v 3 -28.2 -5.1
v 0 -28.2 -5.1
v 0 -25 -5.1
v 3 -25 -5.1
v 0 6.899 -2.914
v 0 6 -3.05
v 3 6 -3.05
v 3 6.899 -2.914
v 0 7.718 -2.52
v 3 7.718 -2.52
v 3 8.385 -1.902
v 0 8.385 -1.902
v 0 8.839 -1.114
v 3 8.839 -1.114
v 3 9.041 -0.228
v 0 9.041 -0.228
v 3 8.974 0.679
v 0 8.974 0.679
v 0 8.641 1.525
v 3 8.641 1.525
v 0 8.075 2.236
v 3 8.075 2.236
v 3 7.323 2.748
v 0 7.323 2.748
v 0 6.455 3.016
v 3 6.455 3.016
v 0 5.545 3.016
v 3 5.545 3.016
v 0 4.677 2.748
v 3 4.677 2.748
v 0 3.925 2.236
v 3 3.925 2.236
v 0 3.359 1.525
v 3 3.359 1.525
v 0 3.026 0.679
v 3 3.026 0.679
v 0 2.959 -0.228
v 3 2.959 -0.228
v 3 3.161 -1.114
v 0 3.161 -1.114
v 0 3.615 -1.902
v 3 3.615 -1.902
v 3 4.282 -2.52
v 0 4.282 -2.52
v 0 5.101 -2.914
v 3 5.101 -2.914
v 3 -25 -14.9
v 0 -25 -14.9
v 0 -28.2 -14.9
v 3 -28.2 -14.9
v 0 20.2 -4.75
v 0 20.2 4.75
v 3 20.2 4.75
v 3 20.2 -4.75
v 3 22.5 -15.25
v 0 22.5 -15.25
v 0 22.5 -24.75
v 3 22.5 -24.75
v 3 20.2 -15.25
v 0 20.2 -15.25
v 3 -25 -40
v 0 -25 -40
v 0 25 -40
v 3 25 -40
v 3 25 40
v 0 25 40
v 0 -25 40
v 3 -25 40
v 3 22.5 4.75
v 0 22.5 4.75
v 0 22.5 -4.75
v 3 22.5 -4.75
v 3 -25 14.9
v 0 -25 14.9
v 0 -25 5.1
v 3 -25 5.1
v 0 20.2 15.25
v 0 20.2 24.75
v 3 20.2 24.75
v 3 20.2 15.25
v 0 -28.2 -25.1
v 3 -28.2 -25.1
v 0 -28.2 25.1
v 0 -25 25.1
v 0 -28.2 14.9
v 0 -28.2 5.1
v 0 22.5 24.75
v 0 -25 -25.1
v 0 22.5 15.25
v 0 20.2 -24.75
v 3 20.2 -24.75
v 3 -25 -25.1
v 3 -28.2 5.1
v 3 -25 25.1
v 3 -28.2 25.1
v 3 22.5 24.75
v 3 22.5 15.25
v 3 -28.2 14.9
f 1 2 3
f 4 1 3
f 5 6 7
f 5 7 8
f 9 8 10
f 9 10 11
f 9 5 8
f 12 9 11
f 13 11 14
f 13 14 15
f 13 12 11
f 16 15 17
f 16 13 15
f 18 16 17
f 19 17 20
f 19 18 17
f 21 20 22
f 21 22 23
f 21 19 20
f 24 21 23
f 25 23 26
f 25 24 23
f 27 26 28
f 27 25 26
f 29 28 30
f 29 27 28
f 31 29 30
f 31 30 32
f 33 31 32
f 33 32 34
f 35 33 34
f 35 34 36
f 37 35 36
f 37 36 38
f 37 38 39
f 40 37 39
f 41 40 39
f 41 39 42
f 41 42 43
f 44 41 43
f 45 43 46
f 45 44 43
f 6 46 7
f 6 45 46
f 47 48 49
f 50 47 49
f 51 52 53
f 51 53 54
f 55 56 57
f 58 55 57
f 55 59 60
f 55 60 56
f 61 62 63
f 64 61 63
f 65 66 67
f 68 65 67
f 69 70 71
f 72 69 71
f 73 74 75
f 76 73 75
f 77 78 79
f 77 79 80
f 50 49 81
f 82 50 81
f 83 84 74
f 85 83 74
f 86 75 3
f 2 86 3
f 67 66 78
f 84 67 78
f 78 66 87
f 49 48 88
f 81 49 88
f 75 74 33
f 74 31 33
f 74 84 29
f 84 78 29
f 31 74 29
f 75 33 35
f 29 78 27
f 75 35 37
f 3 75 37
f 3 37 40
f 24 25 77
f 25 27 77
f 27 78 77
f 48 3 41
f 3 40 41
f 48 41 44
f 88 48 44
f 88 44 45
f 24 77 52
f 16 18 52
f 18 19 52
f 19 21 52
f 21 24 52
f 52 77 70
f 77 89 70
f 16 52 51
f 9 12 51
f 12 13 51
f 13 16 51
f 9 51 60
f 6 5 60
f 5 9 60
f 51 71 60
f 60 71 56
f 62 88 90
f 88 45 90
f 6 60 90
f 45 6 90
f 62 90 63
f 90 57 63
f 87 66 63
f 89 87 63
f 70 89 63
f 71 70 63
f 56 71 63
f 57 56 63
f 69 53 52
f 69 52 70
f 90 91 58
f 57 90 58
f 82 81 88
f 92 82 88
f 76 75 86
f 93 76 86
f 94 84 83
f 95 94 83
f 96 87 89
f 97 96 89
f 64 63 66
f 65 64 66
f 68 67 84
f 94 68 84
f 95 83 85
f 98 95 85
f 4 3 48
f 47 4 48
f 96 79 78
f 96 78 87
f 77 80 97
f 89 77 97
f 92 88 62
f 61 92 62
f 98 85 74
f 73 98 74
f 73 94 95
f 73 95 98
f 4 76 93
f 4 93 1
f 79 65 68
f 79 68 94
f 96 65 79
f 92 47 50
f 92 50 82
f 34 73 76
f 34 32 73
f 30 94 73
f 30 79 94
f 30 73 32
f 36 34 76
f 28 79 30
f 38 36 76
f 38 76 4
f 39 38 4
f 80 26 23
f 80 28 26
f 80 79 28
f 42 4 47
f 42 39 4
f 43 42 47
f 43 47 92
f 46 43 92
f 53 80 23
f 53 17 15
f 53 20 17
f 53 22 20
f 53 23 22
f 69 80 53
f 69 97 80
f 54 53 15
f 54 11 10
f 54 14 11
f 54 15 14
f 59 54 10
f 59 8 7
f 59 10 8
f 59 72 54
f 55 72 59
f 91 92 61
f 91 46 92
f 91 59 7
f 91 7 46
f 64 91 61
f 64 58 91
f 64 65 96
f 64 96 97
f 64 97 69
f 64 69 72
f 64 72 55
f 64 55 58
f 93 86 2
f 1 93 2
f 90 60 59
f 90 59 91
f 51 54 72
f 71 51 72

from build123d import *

# Parameters (mm, degrees)
CROQUIS1_R              = 3.05
CROQUIS1_W              = 9.5
CROQUIS1_H              = 2.3
SALIENTE_EXTRUIR1_DEPTH = 3


with BuildPart() as part:
    # Croquis1 → Saliente-Extruir1 (new body)
    with BuildSketch(Plane(origin=(0, 0, 0), x_dir=(0, 0, -1), z_dir=(1, 0, 0))):
        Polygon((-14.9, -25), (-5.1, -25), (-5.1, -28.2), (5.1, -28.2), (5.1, -25), (14.9, -25), (14.9, -28.2), (25.1, -28.2), (25.1, -25), (40, -25), (40, 25), (-40, 25), (-40, -25), (-25.1, -25), (-25.1, -28.2), (-14.9, -28.2), align=None)
        with Locations((0, 6)):
            Circle(CROQUIS1_R, mode=Mode.SUBTRACT)
        with Locations((-20, 21.35)):
            Rectangle(CROQUIS1_W, CROQUIS1_H, mode=Mode.SUBTRACT)
        with Locations((0, 21.35)):
            Rectangle(CROQUIS1_W, CROQUIS1_H, mode=Mode.SUBTRACT)
        with Locations((20, 21.35)):
            Rectangle(CROQUIS1_W, CROQUIS1_H, mode=Mode.SUBTRACT)
    extrude(amount=SALIENTE_EXTRUIR1_DEPTH)


solid = part.part
